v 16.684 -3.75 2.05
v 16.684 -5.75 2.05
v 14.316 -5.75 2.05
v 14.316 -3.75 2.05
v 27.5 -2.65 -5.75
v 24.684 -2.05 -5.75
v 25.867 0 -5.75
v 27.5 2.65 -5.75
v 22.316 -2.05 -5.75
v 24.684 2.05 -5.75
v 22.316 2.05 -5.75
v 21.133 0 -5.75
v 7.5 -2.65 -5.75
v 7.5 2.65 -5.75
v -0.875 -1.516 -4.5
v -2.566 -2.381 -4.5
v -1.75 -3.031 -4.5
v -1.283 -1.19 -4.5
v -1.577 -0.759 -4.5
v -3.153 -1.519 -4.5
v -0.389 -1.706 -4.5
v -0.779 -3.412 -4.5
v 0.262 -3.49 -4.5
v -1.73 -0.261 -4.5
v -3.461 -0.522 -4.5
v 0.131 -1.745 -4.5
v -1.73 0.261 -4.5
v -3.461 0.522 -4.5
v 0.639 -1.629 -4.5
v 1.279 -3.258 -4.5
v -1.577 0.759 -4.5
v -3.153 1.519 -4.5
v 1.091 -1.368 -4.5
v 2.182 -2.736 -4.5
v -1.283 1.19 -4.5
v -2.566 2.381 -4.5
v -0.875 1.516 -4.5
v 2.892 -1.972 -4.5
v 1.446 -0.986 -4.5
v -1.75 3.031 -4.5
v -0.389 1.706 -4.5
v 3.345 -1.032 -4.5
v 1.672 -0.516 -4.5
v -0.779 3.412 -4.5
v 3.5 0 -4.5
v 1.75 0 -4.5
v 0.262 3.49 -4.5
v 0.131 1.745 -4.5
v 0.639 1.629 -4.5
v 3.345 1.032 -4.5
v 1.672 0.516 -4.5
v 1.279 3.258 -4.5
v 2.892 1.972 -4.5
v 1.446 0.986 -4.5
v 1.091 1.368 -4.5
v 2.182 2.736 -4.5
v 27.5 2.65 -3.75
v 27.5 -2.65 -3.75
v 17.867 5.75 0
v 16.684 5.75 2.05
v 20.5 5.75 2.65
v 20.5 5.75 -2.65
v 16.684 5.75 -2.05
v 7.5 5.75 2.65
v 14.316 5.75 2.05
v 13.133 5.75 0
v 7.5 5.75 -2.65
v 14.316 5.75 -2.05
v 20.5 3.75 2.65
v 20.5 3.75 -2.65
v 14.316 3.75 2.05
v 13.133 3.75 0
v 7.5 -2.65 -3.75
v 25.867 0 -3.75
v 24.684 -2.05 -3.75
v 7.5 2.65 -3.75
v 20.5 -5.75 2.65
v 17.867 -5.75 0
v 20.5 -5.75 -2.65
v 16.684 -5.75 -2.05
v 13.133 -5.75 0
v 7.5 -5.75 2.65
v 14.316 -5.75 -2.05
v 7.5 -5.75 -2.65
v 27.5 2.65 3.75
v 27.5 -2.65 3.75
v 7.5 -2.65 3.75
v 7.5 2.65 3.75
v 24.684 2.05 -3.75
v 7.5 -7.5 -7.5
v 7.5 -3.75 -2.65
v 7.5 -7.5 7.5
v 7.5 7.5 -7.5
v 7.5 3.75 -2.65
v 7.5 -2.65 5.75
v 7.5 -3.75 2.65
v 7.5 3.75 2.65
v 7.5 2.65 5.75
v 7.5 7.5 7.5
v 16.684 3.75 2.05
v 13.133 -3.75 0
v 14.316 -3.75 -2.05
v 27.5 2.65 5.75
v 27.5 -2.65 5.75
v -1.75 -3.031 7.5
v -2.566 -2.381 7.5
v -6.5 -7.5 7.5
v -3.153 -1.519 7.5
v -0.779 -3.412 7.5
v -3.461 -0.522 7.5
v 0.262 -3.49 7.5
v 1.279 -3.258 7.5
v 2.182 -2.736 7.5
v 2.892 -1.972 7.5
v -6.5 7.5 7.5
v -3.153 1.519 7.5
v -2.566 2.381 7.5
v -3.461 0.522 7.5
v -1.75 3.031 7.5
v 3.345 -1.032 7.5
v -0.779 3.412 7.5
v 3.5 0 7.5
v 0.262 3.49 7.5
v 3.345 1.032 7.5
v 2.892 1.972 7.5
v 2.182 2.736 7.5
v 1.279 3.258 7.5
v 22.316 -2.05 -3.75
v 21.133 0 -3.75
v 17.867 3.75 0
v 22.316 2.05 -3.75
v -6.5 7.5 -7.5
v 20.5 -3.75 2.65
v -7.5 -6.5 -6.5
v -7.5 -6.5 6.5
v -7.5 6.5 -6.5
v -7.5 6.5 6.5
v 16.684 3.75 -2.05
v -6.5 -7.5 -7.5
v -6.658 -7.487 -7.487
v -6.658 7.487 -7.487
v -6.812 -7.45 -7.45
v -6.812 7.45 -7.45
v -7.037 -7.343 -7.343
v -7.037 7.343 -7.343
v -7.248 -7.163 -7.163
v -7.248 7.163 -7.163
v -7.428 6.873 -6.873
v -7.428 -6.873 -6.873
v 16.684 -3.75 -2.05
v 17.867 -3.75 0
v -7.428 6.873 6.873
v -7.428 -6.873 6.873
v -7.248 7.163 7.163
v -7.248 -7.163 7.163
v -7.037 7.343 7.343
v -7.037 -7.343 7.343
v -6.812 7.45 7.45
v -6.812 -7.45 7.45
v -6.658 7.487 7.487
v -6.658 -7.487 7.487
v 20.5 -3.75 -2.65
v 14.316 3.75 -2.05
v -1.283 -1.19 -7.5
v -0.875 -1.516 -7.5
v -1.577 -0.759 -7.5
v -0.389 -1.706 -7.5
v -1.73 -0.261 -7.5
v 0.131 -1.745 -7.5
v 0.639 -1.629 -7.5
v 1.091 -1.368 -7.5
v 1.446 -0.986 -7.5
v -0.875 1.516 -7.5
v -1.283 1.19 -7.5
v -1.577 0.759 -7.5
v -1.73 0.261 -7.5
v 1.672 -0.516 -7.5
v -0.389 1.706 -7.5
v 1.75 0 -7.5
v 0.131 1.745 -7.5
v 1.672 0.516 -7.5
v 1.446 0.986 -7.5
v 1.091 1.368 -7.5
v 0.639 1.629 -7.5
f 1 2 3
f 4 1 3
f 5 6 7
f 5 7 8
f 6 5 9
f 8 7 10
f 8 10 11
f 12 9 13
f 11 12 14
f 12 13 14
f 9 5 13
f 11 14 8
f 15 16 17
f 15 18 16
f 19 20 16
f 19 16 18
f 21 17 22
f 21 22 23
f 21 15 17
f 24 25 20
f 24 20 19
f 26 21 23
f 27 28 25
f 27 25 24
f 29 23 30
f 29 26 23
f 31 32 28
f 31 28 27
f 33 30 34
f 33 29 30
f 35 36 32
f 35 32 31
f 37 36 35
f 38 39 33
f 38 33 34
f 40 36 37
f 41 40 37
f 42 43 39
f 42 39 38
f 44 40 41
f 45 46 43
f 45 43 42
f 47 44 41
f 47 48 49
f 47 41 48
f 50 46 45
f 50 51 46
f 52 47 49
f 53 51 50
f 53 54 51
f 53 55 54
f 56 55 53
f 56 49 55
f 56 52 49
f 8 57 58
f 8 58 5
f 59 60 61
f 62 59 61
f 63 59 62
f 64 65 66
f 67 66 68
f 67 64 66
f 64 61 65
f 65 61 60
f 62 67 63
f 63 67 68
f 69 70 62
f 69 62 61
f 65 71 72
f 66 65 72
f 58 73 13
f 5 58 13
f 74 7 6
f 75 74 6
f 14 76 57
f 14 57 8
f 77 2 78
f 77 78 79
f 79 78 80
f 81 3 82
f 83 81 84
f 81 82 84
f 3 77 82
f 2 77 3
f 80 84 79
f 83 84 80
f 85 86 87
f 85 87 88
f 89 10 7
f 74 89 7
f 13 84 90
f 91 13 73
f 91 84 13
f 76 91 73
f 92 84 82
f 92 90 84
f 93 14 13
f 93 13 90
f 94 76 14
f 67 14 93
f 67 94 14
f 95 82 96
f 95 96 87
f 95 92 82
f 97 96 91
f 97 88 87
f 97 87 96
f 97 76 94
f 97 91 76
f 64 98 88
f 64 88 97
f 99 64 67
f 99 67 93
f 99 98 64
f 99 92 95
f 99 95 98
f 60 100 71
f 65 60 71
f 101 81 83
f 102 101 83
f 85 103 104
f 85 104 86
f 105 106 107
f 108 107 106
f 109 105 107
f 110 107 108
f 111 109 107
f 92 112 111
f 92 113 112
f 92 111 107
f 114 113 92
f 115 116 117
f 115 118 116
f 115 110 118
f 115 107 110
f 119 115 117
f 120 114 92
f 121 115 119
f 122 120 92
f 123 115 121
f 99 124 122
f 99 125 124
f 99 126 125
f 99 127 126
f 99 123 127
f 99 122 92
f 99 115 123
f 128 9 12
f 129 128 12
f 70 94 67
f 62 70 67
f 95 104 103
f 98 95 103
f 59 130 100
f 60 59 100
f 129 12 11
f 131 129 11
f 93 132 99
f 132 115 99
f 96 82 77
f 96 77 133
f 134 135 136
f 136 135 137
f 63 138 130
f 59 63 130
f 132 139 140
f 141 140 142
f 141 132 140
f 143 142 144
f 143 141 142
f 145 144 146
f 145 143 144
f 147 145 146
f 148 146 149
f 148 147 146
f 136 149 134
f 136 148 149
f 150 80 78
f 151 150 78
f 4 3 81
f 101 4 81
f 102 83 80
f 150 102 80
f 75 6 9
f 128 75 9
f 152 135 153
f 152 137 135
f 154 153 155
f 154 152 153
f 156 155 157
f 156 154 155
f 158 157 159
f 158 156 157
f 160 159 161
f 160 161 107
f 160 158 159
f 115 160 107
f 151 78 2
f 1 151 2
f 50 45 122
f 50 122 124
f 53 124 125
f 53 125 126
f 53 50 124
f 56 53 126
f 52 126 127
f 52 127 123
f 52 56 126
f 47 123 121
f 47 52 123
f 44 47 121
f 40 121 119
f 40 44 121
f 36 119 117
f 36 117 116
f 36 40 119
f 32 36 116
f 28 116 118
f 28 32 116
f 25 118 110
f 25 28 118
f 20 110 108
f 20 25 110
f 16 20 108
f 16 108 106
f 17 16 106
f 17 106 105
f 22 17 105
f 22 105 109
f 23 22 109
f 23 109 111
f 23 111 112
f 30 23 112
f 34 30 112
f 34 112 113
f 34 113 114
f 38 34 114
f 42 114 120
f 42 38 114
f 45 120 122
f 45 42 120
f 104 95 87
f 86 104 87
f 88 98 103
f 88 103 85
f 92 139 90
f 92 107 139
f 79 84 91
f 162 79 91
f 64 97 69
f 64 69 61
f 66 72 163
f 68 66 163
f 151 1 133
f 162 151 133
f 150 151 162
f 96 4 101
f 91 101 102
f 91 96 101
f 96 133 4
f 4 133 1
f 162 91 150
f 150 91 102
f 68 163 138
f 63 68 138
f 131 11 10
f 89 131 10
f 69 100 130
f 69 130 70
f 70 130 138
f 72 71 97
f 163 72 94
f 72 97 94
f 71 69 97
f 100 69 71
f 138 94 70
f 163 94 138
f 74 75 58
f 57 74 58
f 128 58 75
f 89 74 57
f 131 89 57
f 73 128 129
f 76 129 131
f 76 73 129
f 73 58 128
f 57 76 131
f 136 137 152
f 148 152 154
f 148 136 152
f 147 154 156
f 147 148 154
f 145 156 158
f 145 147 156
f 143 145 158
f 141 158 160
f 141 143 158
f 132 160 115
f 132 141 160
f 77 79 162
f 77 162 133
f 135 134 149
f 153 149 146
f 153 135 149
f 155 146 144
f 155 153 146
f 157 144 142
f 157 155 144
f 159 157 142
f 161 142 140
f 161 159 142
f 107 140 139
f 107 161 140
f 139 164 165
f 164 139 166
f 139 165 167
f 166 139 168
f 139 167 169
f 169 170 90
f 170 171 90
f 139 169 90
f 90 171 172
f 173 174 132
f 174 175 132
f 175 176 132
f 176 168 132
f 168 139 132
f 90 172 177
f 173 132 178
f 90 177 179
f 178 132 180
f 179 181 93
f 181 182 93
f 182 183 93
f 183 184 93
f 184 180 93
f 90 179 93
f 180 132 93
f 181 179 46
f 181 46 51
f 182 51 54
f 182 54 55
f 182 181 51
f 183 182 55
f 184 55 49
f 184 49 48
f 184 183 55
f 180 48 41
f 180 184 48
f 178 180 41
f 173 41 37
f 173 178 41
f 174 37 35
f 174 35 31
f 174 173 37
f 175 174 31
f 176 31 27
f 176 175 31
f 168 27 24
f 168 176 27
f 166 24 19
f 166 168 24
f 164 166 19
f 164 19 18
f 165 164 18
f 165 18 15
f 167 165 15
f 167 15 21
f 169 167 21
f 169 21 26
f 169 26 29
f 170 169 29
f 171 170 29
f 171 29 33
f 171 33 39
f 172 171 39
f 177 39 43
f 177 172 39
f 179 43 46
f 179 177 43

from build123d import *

# Parameters (mm, degrees)
ESBO_O1_W                  = 15
ESBO_O1_H                  = 15
ESBO_O1_R                  = 3.5
RESSALTO_EXTRUS_O1_DEPTH   = 7.5
RESSALTO_EXTRUS_O2_START   = -7.5
ESBO_O1_3_R                = 3.5
ESBO_O1_3_R_2              = 1.75
RESSALTO_EXTRUS_O2_DEPTH   = 3
ESBO_O2_3_R                = 3.5
ESBO_O2_3_R_2              = 1.6
RESSALTO_EXTRUS_O3_DEPTH   = 3
ESBO_O4_3_R                = 3.5
ESBO_O4_3_R_2              = 1.6
RESSALTO_EXTRUS_O4_DEPTH   = 3
ESBO_O6_W                  = 5.3
ESBO_O6_H                  = 2
ESBO_O6_W_2                = 2
ESBO_O6_H_2                = 5.3
RESSALTO_EXTRUS_O5_DEPTH   = 20
ESBO_O7_W                  = 7
ESBO_O7_H                  = 5.3
CORTE_EXTRUS_O3_DEPTH      = 1
CORTE_EXTRUS_O3_DEPTH_BACK = 16
CORTE_EXTRUS_O4_DEPTH      = 3
FILETE1_R                  = 1


with BuildPart() as part:
    # Esboço1 → Ressalto-extrusão1 (new body, symmetric)
    with BuildSketch(Plane.XY):
        Rectangle(ESBO_O1_W, ESBO_O1_H)
        Circle(ESBO_O1_R, mode=Mode.SUBTRACT)
    extrude(amount=RESSALTO_EXTRUS_O1_DEPTH, both=True)

    # Esboço1<3> → Ressalto-extrusão2 (add)
    with BuildSketch(Plane.XY.offset(RESSALTO_EXTRUS_O2_START)):
        Circle(ESBO_O1_3_R)
        Circle(ESBO_O1_3_R_2, mode=Mode.SUBTRACT)
    extrude(amount=RESSALTO_EXTRUS_O2_DEPTH)

    # Esboço2<3> → Ressalto-extrusão3 (add)
    with BuildSketch(Plane(origin=(7.5, 0, 0), x_dir=(0, 0, -1), z_dir=(1, 0, 0))):
        Circle(ESBO_O2_3_R)
        Circle(ESBO_O2_3_R_2, mode=Mode.SUBTRACT)
    extrude(amount=-RESSALTO_EXTRUS_O3_DEPTH)

    # Esboço4<3> → Ressalto-extrusão4 (add)
    with BuildSketch(Plane(origin=(0, 7.5, 0), x_dir=(1, 0, 0), z_dir=(0, 1, 0))):
        Circle(ESBO_O4_3_R)
        Circle(ESBO_O4_3_R_2, mode=Mode.SUBTRACT)
    extrude(amount=-RESSALTO_EXTRUS_O4_DEPTH)

    # Esboço6 → Ressalto-extrusão5 (add)
    with BuildSketch(Plane(origin=(7.5, 0, 0), x_dir=(0, 0, -1), z_dir=(1, 0, 0))):
        with Locations((0, 4.75)):
            Rectangle(ESBO_O6_W, ESBO_O6_H)
        with Locations((4.75, 0)):
            Rectangle(ESBO_O6_W_2, ESBO_O6_H_2)
        with Locations((0, -4.75)):
            Rectangle(ESBO_O6_W, ESBO_O6_H)
        with Locations((-4.75, 0)):
            Rectangle(ESBO_O6_W_2, ESBO_O6_H_2)
    extrude(amount=RESSALTO_EXTRUS_O5_DEPTH)

    # Esboço7 → Corte-extrusão3 (cut, two sides)
    with BuildSketch(Plane.XZ.offset(7.5)) as corte_extrus_o3_sk:
        with Locations((24, 0)):
            Rectangle(ESBO_O7_W, ESBO_O7_H)
        Polygon((17.867136104, 0), (16.683568052, 2.05), (14.316431948, 2.05), (13.132863896, 0), (14.316431948, -2.05), (16.683568052, -2.05), align=None)
    extrude(amount=CORTE_EXTRUS_O3_DEPTH, mode=Mode.SUBTRACT)
    extrude(corte_extrus_o3_sk.sketch, amount=-CORTE_EXTRUS_O3_DEPTH_BACK, mode=Mode.SUBTRACT)

    # Esboço8 → Corte-extrusão4 (cut)
    with BuildSketch(Plane(origin=(0, 0, -5.75), x_dir=(-1, 0, 0), z_dir=(0, 0, -1))):
        Polygon((-25.867136104, 0), (-24.683568052, -2.05), (-22.316431948, -2.05), (-21.132863896, 0), (-22.316431948, 2.05), (-24.683568052, 2.05), align=None)
    extrude(amount=-CORTE_EXTRUS_O4_DEPTH, mode=Mode.SUBTRACT)

    # Filete1
    filete1_edges = [part.edges().sort_by_distance(p)[0] for p in [
        (-7.5, -7.5, 0),
        (-7.5, 7.5, 0),
        (-7.5, 0, 7.5),
        (-7.5, 0, -7.5),
    ]]
    fillet(filete1_edges, radius=FILETE1_R)


solid = part.part
